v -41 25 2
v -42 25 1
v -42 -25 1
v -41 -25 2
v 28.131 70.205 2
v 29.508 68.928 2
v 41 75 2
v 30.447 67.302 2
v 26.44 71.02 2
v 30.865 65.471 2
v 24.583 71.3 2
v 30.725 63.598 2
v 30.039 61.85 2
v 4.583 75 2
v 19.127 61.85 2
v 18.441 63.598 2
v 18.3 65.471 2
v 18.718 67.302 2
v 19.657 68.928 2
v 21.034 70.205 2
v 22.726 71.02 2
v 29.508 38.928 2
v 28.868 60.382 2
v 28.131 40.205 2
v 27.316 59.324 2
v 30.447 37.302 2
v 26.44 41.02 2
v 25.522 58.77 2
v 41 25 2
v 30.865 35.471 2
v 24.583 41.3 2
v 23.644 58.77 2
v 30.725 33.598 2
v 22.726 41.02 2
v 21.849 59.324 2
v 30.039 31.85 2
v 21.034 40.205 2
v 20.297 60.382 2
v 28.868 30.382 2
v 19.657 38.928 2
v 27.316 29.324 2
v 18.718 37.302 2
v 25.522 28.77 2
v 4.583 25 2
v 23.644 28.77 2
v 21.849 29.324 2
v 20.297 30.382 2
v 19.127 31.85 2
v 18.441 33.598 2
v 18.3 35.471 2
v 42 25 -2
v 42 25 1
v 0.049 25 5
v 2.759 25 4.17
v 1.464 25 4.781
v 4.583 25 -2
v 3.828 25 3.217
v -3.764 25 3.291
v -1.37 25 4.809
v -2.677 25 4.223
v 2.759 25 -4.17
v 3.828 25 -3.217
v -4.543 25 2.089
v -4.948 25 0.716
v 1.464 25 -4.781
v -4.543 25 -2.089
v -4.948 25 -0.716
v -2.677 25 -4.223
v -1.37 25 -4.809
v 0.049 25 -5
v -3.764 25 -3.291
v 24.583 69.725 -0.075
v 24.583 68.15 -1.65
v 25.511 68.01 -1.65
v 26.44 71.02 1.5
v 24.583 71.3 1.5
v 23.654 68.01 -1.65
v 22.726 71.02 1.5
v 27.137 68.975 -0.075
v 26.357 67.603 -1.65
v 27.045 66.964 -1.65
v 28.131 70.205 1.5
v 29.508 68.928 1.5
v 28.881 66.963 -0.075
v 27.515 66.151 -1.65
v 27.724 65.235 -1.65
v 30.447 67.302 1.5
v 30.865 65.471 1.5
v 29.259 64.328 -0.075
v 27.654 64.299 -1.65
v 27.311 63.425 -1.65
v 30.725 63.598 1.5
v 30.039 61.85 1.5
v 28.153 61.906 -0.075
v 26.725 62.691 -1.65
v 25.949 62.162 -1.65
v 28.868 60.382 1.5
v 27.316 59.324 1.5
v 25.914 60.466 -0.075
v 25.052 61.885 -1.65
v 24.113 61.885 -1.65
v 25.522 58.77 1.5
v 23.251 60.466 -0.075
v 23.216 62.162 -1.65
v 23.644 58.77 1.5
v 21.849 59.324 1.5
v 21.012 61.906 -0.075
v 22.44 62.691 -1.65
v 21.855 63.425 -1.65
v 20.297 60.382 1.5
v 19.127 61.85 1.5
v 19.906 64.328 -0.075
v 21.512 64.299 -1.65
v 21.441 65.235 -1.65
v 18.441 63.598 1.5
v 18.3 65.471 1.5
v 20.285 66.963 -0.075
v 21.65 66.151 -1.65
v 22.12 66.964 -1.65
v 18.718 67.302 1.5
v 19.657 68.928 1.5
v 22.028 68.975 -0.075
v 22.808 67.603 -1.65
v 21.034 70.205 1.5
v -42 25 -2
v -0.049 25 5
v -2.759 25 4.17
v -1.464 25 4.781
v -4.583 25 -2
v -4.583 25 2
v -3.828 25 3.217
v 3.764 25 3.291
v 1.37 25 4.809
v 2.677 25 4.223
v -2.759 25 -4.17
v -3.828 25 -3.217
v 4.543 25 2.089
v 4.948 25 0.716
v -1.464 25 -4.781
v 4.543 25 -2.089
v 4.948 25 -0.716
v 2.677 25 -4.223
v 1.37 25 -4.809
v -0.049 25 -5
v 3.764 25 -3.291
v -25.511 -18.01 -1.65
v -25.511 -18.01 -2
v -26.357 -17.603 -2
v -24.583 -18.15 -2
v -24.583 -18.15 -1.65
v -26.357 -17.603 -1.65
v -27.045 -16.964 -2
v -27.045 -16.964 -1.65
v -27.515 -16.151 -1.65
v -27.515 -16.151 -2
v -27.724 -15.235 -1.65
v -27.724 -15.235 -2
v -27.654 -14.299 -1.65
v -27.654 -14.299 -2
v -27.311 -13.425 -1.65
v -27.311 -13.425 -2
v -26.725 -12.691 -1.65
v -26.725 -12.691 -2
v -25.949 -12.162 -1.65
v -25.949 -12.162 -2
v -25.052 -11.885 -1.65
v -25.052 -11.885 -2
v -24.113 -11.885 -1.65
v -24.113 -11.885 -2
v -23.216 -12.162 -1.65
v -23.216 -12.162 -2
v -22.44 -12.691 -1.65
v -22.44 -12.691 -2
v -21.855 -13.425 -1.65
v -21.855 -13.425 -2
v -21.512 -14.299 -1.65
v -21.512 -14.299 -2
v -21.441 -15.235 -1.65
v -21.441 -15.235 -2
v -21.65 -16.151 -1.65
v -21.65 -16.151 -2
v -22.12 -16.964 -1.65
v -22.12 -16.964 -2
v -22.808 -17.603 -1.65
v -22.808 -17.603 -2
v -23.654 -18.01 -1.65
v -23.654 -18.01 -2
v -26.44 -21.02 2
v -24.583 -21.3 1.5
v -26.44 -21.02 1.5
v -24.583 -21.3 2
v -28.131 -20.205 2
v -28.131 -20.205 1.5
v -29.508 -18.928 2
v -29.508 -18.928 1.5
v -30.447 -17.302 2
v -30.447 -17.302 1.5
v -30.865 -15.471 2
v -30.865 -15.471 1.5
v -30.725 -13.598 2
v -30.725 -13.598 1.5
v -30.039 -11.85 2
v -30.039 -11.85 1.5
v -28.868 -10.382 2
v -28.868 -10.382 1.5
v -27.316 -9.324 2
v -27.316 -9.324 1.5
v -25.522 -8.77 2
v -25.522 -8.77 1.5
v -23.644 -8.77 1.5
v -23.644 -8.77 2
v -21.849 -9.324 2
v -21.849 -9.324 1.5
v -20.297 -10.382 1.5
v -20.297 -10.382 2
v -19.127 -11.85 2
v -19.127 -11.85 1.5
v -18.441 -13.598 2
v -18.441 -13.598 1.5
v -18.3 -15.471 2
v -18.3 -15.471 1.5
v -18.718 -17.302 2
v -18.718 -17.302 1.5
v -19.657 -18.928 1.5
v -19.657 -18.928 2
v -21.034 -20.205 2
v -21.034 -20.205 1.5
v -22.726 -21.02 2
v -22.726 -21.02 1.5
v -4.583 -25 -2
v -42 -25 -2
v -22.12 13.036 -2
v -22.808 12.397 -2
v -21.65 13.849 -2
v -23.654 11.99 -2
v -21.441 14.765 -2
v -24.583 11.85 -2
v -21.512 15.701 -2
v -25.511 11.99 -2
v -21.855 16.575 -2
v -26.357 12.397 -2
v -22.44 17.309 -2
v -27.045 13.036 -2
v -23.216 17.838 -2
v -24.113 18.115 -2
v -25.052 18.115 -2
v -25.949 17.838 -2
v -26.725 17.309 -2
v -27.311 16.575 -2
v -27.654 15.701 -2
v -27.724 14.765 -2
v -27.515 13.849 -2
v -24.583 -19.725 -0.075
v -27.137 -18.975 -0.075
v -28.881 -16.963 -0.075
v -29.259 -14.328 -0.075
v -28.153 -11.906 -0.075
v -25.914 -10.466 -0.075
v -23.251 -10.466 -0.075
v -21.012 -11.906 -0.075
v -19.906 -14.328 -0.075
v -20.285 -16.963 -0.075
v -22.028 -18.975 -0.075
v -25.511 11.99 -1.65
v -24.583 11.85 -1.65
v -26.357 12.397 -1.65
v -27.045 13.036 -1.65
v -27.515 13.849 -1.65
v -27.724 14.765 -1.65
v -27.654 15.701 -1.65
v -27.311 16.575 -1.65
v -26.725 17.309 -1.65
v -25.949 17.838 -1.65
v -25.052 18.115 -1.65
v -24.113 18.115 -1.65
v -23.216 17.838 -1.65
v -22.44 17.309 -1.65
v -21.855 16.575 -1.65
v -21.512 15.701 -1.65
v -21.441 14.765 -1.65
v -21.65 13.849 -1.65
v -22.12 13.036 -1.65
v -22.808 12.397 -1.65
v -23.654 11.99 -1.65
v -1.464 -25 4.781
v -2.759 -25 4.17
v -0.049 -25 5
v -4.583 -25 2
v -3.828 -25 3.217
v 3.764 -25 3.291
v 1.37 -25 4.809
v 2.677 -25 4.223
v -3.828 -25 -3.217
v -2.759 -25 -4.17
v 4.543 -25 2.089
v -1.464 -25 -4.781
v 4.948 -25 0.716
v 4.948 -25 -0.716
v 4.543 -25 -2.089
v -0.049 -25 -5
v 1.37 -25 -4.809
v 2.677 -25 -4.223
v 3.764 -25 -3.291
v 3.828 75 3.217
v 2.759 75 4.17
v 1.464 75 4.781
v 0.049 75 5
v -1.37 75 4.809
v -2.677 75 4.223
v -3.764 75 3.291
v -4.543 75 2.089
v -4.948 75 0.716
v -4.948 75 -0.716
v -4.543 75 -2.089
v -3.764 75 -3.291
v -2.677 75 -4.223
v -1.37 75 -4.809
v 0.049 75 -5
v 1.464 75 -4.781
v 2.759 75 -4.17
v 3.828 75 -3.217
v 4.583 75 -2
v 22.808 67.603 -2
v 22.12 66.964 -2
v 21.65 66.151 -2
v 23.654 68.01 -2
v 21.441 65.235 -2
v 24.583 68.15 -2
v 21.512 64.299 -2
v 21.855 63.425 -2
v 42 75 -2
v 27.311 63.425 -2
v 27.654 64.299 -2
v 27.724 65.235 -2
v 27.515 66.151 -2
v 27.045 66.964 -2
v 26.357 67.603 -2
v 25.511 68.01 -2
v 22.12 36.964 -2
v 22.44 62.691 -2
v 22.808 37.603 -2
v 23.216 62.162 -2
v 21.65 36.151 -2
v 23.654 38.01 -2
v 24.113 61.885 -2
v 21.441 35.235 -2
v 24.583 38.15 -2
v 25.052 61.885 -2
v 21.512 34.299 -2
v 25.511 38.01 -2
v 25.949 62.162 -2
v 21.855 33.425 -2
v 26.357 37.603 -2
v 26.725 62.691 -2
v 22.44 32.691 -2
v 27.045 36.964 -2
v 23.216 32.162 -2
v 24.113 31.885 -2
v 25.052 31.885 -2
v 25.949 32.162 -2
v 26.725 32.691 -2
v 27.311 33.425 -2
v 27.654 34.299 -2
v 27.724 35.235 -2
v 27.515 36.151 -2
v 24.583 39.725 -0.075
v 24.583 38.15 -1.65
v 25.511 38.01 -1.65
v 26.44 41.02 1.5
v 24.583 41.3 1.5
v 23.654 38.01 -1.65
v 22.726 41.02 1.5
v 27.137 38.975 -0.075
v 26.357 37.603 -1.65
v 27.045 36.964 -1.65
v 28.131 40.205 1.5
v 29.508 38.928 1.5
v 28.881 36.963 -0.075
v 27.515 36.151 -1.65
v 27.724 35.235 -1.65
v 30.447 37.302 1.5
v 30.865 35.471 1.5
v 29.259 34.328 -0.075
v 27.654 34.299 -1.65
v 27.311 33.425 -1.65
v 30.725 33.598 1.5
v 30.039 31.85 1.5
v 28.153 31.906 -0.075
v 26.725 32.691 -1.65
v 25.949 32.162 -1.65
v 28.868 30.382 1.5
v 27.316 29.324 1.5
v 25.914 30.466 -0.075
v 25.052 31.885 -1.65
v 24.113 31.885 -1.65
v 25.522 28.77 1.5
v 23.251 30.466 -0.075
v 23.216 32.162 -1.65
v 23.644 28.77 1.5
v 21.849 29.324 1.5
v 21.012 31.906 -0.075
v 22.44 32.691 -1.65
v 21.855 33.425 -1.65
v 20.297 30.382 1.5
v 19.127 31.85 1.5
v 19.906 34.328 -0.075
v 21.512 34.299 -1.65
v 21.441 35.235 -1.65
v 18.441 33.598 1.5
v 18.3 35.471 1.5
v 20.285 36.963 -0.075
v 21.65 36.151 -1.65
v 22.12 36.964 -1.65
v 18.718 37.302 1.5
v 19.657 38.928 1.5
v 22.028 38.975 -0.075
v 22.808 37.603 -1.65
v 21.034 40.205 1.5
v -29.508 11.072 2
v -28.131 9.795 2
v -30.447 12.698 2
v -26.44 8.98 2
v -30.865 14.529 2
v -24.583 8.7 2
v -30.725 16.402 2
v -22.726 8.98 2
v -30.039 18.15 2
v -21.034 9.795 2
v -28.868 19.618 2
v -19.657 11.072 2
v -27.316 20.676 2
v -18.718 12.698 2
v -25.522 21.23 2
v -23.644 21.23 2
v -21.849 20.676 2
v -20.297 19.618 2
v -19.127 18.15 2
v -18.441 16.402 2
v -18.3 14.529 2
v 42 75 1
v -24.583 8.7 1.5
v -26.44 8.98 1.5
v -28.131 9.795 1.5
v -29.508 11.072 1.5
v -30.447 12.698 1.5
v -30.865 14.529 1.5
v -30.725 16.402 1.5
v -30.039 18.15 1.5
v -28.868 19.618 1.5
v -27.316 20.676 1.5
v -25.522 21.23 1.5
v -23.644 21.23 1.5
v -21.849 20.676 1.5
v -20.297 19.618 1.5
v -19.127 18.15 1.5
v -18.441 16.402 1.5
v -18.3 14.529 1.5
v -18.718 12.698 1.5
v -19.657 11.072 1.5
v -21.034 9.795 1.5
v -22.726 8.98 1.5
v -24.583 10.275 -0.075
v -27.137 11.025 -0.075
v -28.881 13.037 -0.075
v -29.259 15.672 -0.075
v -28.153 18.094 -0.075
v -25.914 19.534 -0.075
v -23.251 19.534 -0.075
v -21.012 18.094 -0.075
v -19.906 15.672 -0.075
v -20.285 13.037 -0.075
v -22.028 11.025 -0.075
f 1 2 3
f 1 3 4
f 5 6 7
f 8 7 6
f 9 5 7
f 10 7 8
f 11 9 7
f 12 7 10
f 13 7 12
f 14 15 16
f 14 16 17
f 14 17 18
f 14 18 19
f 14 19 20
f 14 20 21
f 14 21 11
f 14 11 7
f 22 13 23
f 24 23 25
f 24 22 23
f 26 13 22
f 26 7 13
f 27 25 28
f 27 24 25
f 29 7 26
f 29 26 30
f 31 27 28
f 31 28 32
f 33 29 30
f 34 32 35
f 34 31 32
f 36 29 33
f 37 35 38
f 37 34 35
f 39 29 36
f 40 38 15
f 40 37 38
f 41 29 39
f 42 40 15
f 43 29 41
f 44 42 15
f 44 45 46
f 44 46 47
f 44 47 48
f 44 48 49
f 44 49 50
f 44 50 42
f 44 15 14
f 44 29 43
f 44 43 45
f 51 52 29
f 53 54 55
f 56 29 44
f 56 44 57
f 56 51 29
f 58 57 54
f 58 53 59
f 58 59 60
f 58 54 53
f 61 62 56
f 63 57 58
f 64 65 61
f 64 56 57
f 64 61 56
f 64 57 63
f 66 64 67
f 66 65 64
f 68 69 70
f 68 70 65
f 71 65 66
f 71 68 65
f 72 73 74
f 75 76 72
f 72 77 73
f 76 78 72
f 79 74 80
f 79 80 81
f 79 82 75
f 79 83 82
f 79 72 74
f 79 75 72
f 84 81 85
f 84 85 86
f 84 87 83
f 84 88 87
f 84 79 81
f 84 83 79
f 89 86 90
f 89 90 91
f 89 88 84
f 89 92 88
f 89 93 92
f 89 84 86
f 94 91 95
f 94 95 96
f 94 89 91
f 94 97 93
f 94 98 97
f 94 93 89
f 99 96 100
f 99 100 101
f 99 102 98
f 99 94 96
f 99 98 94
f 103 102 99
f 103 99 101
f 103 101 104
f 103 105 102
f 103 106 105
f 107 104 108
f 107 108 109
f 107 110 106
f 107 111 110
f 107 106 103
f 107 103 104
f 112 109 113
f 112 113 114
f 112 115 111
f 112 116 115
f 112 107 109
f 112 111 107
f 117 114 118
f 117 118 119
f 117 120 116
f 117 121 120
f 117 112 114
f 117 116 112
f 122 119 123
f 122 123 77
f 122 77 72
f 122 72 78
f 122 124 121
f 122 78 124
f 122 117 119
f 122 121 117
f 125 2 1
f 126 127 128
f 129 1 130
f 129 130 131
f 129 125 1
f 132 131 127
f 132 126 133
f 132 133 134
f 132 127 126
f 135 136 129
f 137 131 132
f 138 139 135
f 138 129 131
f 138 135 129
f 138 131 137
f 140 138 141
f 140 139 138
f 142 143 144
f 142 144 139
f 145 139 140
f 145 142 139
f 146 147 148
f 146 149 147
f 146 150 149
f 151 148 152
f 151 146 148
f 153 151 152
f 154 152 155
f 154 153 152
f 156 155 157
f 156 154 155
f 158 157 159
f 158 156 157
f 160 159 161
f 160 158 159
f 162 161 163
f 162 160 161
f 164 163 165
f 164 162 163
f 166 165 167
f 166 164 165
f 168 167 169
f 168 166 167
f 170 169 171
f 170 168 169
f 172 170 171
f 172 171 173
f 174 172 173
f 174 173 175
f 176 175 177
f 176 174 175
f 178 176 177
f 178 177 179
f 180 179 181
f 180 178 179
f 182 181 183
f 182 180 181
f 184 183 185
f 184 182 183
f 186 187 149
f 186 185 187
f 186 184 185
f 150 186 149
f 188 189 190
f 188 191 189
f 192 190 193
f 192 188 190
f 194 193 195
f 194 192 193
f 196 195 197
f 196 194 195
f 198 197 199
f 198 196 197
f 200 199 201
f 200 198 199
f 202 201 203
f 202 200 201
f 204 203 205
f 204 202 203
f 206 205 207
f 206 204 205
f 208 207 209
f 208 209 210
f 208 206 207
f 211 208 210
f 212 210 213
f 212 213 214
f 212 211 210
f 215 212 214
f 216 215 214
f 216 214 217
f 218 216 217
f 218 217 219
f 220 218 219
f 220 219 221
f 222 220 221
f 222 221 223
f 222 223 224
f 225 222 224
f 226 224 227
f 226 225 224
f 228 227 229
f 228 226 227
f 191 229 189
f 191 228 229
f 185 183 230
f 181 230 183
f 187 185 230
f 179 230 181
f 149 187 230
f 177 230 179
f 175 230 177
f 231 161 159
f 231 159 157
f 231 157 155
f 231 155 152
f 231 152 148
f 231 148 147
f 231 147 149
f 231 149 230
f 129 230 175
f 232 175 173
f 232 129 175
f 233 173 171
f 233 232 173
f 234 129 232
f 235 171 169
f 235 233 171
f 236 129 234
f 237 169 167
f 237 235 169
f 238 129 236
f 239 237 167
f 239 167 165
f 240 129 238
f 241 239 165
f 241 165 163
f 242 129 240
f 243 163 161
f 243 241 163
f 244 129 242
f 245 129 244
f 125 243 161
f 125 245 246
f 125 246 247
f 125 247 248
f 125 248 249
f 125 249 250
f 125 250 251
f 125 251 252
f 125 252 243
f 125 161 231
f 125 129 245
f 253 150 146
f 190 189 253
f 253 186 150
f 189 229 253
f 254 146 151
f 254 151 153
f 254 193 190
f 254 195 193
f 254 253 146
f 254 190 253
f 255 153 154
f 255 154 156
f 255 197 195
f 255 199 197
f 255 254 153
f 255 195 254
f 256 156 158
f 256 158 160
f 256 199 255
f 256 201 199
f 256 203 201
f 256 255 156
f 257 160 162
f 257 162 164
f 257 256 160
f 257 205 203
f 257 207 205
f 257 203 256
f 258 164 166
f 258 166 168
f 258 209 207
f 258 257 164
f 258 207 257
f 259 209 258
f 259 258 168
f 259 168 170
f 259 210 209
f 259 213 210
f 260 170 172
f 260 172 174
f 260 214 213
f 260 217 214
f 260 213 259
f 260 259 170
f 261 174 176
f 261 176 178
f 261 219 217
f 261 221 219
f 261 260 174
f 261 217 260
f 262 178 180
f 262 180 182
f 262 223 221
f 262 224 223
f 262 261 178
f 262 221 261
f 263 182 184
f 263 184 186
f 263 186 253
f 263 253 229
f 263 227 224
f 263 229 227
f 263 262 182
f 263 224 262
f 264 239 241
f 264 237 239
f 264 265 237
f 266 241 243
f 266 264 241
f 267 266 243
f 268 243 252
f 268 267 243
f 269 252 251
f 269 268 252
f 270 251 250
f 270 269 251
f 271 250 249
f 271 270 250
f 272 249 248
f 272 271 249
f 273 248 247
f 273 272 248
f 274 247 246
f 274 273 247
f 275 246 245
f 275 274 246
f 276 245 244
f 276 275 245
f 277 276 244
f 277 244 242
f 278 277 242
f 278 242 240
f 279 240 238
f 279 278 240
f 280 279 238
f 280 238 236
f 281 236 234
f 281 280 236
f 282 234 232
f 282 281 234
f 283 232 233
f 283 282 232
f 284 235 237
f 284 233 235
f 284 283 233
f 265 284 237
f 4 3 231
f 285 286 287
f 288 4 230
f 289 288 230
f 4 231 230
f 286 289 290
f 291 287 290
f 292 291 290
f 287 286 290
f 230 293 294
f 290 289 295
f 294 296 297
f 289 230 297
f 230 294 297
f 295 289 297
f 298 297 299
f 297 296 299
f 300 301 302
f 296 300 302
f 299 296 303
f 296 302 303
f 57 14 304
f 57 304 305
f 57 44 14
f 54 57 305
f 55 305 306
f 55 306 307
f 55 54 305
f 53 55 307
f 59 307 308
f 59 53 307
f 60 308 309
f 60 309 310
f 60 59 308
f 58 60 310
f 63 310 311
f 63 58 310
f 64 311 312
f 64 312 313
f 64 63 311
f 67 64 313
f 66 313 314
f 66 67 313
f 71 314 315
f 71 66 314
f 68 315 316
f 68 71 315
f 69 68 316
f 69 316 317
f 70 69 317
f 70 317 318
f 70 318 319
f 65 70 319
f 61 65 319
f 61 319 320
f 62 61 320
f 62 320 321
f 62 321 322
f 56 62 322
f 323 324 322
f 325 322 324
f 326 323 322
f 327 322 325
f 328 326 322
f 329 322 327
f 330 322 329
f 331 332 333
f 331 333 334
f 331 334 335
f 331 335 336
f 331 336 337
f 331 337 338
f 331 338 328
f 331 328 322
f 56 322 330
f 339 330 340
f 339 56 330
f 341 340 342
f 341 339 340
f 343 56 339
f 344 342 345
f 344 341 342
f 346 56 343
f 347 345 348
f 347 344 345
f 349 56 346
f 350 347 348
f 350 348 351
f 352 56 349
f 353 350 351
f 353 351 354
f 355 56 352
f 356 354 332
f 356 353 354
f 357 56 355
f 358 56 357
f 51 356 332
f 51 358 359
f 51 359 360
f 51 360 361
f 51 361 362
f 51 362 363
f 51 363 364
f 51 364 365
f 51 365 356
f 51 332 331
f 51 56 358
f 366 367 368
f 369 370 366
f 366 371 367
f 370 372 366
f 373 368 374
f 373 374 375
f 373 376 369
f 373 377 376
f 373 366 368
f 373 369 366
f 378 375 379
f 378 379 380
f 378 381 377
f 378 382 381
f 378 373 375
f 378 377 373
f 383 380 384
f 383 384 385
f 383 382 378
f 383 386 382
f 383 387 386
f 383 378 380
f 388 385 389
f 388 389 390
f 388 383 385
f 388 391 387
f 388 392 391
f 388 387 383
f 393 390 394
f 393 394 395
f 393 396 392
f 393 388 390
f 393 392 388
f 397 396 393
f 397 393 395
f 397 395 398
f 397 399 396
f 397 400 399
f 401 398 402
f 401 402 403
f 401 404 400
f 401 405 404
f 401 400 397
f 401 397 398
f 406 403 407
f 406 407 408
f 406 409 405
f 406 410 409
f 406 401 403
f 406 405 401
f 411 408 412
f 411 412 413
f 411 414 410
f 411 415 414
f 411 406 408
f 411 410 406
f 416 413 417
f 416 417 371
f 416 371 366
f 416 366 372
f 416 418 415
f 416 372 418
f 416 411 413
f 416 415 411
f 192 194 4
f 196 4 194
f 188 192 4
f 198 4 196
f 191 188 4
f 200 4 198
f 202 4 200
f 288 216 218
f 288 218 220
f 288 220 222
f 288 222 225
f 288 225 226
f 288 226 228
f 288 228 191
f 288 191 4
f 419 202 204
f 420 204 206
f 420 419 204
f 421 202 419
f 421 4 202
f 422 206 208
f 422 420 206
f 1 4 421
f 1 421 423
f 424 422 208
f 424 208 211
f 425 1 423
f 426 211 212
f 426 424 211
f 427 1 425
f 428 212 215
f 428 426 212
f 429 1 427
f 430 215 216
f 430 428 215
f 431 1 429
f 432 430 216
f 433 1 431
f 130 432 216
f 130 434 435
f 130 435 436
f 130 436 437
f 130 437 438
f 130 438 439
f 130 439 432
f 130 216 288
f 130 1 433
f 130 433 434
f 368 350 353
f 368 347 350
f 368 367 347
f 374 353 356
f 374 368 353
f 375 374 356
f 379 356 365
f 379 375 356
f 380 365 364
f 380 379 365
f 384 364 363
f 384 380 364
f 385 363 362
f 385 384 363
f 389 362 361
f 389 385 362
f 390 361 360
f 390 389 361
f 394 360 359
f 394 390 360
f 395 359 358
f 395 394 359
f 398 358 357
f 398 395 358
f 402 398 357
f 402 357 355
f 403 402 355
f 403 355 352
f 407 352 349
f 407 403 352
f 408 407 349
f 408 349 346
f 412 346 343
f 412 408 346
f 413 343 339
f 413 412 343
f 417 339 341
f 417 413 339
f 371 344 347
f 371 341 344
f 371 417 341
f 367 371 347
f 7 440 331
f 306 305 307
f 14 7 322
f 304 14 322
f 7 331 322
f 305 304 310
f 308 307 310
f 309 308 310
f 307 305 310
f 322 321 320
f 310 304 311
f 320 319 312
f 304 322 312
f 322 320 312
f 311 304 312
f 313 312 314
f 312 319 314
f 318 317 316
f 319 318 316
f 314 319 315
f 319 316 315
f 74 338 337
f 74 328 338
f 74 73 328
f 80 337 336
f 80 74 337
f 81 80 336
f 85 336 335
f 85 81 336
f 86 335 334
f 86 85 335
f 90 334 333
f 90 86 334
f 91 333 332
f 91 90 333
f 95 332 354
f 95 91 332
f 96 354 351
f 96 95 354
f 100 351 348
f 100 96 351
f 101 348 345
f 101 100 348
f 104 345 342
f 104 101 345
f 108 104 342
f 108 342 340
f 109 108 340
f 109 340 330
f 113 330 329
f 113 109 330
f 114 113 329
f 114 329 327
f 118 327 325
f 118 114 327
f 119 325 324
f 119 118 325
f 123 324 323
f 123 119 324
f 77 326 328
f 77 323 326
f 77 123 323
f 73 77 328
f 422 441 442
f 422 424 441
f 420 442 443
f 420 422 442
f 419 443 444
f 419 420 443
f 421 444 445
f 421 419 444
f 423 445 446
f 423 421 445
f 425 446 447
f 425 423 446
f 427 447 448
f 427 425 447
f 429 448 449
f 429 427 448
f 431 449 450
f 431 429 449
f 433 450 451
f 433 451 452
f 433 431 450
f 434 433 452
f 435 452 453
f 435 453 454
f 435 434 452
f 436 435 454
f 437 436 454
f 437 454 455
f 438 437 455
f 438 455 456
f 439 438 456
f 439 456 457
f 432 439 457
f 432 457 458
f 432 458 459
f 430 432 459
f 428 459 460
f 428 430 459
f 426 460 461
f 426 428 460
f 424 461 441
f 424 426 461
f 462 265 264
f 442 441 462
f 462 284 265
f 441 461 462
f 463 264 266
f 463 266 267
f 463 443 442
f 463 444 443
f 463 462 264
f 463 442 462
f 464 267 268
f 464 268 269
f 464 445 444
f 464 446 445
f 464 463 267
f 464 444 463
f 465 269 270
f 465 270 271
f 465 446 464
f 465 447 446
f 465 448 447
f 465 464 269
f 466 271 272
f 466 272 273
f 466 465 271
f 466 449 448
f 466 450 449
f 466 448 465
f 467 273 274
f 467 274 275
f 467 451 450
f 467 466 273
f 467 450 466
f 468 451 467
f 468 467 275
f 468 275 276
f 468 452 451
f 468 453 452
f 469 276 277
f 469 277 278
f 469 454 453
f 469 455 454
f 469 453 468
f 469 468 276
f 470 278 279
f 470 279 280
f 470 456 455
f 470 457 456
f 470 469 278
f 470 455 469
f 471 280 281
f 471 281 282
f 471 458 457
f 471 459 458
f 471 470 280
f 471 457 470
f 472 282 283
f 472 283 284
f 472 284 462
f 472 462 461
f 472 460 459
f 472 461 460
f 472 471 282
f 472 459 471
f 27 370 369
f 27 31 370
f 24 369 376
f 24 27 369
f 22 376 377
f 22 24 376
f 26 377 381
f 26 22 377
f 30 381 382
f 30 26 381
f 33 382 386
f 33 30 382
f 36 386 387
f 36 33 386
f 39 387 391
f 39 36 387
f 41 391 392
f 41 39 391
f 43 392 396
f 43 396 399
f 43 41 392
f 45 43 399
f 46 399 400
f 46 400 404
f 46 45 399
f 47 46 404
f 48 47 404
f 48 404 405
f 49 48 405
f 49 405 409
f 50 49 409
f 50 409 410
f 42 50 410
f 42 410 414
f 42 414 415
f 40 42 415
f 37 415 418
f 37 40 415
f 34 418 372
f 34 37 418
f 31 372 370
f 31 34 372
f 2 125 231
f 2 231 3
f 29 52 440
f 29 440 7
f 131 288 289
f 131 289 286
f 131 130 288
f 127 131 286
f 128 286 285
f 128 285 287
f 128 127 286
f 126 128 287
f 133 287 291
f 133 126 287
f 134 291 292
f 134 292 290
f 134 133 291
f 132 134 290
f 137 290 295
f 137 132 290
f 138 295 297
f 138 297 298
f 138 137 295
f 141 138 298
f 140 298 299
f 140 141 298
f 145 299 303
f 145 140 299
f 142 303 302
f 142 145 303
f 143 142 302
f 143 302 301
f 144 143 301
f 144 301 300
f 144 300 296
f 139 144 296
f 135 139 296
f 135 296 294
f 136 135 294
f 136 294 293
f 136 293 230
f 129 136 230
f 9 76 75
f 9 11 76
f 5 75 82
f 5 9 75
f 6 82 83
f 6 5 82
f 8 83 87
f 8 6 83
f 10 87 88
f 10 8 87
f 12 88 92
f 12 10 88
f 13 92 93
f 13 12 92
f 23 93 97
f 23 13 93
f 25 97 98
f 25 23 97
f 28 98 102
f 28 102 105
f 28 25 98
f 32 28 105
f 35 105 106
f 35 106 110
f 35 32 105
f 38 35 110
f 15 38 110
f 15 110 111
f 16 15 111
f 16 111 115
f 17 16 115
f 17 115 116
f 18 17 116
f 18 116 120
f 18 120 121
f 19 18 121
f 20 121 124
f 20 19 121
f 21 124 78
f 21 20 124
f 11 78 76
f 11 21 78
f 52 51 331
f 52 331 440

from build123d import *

# Parameters (mm, degrees)
EXTRUDE_1_DEPTH            = 25
HOLE_WIZARD_M61_AT_2_COUNT = 2
HOLE_WIZARD_M61_AT_2_PITCH = 30
PATTERN_CIRCULAR_1_COUNT   = 2


with BuildPart() as part:
    # Эскиз1 → Бобышка-Вытянуть1 (new body, symmetric)
    with BuildSketch(Plane(origin=(0, 0, 0), x_dir=(1, 0, 0), z_dir=(0, 1, 0))):
        with BuildLine():
            Line((-4.582575695, 2), (-42, 2))
            Line((-42, 2), (-42, -1))
            Line((-42, -1), (-41, -2))
            Line((-41, -2), (-4.582575695, -2))
            ThreePointArc((-4.582575695, -2), (5, 0), (-4.582575695, 2))
        make_face()
    extrude(amount=EXTRUDE_1_DEPTH, both=True)

    # Эскиз6 → Зенковка для винта с полупотайной головкой M61 (revolve, cut)
    with BuildSketch(Plane(origin=(-24.582575695, 15, 2), x_dir=(0, -1, 0), z_dir=(1, 0, 0))):
        Polygon((0, 0), (0, 7), (3.15, 7), (3.15, 3.65), (6.3, 0.5), (6.3, 0), align=None)
    hole_wizard_m61 = revolve(axis=Axis((-24.582575695, 15, 8.35), (0, 0, -1)), mode=Mode.SUBTRACT)

    # Зенковка для винта с полупотайной головкой M61 at 2: Зенковка для винта с полупотайной головкой M61 ×2
    with Locations(*[(0, -i * HOLE_WIZARD_M61_AT_2_PITCH, 0) for i in range(1, HOLE_WIZARD_M61_AT_2_COUNT)]):
        add(hole_wizard_m61, mode=Mode.SUBTRACT)


with BuildPart() as pattern_circular_1_1:
    # Круговой массив1: pattern copy
    add(part.part.rotate(Axis((0, 25, 0), (0, 0, 1)), 1 * 360 / PATTERN_CIRCULAR_1_COUNT))


solid = Compound([part.part, pattern_circular_1_1.part])
